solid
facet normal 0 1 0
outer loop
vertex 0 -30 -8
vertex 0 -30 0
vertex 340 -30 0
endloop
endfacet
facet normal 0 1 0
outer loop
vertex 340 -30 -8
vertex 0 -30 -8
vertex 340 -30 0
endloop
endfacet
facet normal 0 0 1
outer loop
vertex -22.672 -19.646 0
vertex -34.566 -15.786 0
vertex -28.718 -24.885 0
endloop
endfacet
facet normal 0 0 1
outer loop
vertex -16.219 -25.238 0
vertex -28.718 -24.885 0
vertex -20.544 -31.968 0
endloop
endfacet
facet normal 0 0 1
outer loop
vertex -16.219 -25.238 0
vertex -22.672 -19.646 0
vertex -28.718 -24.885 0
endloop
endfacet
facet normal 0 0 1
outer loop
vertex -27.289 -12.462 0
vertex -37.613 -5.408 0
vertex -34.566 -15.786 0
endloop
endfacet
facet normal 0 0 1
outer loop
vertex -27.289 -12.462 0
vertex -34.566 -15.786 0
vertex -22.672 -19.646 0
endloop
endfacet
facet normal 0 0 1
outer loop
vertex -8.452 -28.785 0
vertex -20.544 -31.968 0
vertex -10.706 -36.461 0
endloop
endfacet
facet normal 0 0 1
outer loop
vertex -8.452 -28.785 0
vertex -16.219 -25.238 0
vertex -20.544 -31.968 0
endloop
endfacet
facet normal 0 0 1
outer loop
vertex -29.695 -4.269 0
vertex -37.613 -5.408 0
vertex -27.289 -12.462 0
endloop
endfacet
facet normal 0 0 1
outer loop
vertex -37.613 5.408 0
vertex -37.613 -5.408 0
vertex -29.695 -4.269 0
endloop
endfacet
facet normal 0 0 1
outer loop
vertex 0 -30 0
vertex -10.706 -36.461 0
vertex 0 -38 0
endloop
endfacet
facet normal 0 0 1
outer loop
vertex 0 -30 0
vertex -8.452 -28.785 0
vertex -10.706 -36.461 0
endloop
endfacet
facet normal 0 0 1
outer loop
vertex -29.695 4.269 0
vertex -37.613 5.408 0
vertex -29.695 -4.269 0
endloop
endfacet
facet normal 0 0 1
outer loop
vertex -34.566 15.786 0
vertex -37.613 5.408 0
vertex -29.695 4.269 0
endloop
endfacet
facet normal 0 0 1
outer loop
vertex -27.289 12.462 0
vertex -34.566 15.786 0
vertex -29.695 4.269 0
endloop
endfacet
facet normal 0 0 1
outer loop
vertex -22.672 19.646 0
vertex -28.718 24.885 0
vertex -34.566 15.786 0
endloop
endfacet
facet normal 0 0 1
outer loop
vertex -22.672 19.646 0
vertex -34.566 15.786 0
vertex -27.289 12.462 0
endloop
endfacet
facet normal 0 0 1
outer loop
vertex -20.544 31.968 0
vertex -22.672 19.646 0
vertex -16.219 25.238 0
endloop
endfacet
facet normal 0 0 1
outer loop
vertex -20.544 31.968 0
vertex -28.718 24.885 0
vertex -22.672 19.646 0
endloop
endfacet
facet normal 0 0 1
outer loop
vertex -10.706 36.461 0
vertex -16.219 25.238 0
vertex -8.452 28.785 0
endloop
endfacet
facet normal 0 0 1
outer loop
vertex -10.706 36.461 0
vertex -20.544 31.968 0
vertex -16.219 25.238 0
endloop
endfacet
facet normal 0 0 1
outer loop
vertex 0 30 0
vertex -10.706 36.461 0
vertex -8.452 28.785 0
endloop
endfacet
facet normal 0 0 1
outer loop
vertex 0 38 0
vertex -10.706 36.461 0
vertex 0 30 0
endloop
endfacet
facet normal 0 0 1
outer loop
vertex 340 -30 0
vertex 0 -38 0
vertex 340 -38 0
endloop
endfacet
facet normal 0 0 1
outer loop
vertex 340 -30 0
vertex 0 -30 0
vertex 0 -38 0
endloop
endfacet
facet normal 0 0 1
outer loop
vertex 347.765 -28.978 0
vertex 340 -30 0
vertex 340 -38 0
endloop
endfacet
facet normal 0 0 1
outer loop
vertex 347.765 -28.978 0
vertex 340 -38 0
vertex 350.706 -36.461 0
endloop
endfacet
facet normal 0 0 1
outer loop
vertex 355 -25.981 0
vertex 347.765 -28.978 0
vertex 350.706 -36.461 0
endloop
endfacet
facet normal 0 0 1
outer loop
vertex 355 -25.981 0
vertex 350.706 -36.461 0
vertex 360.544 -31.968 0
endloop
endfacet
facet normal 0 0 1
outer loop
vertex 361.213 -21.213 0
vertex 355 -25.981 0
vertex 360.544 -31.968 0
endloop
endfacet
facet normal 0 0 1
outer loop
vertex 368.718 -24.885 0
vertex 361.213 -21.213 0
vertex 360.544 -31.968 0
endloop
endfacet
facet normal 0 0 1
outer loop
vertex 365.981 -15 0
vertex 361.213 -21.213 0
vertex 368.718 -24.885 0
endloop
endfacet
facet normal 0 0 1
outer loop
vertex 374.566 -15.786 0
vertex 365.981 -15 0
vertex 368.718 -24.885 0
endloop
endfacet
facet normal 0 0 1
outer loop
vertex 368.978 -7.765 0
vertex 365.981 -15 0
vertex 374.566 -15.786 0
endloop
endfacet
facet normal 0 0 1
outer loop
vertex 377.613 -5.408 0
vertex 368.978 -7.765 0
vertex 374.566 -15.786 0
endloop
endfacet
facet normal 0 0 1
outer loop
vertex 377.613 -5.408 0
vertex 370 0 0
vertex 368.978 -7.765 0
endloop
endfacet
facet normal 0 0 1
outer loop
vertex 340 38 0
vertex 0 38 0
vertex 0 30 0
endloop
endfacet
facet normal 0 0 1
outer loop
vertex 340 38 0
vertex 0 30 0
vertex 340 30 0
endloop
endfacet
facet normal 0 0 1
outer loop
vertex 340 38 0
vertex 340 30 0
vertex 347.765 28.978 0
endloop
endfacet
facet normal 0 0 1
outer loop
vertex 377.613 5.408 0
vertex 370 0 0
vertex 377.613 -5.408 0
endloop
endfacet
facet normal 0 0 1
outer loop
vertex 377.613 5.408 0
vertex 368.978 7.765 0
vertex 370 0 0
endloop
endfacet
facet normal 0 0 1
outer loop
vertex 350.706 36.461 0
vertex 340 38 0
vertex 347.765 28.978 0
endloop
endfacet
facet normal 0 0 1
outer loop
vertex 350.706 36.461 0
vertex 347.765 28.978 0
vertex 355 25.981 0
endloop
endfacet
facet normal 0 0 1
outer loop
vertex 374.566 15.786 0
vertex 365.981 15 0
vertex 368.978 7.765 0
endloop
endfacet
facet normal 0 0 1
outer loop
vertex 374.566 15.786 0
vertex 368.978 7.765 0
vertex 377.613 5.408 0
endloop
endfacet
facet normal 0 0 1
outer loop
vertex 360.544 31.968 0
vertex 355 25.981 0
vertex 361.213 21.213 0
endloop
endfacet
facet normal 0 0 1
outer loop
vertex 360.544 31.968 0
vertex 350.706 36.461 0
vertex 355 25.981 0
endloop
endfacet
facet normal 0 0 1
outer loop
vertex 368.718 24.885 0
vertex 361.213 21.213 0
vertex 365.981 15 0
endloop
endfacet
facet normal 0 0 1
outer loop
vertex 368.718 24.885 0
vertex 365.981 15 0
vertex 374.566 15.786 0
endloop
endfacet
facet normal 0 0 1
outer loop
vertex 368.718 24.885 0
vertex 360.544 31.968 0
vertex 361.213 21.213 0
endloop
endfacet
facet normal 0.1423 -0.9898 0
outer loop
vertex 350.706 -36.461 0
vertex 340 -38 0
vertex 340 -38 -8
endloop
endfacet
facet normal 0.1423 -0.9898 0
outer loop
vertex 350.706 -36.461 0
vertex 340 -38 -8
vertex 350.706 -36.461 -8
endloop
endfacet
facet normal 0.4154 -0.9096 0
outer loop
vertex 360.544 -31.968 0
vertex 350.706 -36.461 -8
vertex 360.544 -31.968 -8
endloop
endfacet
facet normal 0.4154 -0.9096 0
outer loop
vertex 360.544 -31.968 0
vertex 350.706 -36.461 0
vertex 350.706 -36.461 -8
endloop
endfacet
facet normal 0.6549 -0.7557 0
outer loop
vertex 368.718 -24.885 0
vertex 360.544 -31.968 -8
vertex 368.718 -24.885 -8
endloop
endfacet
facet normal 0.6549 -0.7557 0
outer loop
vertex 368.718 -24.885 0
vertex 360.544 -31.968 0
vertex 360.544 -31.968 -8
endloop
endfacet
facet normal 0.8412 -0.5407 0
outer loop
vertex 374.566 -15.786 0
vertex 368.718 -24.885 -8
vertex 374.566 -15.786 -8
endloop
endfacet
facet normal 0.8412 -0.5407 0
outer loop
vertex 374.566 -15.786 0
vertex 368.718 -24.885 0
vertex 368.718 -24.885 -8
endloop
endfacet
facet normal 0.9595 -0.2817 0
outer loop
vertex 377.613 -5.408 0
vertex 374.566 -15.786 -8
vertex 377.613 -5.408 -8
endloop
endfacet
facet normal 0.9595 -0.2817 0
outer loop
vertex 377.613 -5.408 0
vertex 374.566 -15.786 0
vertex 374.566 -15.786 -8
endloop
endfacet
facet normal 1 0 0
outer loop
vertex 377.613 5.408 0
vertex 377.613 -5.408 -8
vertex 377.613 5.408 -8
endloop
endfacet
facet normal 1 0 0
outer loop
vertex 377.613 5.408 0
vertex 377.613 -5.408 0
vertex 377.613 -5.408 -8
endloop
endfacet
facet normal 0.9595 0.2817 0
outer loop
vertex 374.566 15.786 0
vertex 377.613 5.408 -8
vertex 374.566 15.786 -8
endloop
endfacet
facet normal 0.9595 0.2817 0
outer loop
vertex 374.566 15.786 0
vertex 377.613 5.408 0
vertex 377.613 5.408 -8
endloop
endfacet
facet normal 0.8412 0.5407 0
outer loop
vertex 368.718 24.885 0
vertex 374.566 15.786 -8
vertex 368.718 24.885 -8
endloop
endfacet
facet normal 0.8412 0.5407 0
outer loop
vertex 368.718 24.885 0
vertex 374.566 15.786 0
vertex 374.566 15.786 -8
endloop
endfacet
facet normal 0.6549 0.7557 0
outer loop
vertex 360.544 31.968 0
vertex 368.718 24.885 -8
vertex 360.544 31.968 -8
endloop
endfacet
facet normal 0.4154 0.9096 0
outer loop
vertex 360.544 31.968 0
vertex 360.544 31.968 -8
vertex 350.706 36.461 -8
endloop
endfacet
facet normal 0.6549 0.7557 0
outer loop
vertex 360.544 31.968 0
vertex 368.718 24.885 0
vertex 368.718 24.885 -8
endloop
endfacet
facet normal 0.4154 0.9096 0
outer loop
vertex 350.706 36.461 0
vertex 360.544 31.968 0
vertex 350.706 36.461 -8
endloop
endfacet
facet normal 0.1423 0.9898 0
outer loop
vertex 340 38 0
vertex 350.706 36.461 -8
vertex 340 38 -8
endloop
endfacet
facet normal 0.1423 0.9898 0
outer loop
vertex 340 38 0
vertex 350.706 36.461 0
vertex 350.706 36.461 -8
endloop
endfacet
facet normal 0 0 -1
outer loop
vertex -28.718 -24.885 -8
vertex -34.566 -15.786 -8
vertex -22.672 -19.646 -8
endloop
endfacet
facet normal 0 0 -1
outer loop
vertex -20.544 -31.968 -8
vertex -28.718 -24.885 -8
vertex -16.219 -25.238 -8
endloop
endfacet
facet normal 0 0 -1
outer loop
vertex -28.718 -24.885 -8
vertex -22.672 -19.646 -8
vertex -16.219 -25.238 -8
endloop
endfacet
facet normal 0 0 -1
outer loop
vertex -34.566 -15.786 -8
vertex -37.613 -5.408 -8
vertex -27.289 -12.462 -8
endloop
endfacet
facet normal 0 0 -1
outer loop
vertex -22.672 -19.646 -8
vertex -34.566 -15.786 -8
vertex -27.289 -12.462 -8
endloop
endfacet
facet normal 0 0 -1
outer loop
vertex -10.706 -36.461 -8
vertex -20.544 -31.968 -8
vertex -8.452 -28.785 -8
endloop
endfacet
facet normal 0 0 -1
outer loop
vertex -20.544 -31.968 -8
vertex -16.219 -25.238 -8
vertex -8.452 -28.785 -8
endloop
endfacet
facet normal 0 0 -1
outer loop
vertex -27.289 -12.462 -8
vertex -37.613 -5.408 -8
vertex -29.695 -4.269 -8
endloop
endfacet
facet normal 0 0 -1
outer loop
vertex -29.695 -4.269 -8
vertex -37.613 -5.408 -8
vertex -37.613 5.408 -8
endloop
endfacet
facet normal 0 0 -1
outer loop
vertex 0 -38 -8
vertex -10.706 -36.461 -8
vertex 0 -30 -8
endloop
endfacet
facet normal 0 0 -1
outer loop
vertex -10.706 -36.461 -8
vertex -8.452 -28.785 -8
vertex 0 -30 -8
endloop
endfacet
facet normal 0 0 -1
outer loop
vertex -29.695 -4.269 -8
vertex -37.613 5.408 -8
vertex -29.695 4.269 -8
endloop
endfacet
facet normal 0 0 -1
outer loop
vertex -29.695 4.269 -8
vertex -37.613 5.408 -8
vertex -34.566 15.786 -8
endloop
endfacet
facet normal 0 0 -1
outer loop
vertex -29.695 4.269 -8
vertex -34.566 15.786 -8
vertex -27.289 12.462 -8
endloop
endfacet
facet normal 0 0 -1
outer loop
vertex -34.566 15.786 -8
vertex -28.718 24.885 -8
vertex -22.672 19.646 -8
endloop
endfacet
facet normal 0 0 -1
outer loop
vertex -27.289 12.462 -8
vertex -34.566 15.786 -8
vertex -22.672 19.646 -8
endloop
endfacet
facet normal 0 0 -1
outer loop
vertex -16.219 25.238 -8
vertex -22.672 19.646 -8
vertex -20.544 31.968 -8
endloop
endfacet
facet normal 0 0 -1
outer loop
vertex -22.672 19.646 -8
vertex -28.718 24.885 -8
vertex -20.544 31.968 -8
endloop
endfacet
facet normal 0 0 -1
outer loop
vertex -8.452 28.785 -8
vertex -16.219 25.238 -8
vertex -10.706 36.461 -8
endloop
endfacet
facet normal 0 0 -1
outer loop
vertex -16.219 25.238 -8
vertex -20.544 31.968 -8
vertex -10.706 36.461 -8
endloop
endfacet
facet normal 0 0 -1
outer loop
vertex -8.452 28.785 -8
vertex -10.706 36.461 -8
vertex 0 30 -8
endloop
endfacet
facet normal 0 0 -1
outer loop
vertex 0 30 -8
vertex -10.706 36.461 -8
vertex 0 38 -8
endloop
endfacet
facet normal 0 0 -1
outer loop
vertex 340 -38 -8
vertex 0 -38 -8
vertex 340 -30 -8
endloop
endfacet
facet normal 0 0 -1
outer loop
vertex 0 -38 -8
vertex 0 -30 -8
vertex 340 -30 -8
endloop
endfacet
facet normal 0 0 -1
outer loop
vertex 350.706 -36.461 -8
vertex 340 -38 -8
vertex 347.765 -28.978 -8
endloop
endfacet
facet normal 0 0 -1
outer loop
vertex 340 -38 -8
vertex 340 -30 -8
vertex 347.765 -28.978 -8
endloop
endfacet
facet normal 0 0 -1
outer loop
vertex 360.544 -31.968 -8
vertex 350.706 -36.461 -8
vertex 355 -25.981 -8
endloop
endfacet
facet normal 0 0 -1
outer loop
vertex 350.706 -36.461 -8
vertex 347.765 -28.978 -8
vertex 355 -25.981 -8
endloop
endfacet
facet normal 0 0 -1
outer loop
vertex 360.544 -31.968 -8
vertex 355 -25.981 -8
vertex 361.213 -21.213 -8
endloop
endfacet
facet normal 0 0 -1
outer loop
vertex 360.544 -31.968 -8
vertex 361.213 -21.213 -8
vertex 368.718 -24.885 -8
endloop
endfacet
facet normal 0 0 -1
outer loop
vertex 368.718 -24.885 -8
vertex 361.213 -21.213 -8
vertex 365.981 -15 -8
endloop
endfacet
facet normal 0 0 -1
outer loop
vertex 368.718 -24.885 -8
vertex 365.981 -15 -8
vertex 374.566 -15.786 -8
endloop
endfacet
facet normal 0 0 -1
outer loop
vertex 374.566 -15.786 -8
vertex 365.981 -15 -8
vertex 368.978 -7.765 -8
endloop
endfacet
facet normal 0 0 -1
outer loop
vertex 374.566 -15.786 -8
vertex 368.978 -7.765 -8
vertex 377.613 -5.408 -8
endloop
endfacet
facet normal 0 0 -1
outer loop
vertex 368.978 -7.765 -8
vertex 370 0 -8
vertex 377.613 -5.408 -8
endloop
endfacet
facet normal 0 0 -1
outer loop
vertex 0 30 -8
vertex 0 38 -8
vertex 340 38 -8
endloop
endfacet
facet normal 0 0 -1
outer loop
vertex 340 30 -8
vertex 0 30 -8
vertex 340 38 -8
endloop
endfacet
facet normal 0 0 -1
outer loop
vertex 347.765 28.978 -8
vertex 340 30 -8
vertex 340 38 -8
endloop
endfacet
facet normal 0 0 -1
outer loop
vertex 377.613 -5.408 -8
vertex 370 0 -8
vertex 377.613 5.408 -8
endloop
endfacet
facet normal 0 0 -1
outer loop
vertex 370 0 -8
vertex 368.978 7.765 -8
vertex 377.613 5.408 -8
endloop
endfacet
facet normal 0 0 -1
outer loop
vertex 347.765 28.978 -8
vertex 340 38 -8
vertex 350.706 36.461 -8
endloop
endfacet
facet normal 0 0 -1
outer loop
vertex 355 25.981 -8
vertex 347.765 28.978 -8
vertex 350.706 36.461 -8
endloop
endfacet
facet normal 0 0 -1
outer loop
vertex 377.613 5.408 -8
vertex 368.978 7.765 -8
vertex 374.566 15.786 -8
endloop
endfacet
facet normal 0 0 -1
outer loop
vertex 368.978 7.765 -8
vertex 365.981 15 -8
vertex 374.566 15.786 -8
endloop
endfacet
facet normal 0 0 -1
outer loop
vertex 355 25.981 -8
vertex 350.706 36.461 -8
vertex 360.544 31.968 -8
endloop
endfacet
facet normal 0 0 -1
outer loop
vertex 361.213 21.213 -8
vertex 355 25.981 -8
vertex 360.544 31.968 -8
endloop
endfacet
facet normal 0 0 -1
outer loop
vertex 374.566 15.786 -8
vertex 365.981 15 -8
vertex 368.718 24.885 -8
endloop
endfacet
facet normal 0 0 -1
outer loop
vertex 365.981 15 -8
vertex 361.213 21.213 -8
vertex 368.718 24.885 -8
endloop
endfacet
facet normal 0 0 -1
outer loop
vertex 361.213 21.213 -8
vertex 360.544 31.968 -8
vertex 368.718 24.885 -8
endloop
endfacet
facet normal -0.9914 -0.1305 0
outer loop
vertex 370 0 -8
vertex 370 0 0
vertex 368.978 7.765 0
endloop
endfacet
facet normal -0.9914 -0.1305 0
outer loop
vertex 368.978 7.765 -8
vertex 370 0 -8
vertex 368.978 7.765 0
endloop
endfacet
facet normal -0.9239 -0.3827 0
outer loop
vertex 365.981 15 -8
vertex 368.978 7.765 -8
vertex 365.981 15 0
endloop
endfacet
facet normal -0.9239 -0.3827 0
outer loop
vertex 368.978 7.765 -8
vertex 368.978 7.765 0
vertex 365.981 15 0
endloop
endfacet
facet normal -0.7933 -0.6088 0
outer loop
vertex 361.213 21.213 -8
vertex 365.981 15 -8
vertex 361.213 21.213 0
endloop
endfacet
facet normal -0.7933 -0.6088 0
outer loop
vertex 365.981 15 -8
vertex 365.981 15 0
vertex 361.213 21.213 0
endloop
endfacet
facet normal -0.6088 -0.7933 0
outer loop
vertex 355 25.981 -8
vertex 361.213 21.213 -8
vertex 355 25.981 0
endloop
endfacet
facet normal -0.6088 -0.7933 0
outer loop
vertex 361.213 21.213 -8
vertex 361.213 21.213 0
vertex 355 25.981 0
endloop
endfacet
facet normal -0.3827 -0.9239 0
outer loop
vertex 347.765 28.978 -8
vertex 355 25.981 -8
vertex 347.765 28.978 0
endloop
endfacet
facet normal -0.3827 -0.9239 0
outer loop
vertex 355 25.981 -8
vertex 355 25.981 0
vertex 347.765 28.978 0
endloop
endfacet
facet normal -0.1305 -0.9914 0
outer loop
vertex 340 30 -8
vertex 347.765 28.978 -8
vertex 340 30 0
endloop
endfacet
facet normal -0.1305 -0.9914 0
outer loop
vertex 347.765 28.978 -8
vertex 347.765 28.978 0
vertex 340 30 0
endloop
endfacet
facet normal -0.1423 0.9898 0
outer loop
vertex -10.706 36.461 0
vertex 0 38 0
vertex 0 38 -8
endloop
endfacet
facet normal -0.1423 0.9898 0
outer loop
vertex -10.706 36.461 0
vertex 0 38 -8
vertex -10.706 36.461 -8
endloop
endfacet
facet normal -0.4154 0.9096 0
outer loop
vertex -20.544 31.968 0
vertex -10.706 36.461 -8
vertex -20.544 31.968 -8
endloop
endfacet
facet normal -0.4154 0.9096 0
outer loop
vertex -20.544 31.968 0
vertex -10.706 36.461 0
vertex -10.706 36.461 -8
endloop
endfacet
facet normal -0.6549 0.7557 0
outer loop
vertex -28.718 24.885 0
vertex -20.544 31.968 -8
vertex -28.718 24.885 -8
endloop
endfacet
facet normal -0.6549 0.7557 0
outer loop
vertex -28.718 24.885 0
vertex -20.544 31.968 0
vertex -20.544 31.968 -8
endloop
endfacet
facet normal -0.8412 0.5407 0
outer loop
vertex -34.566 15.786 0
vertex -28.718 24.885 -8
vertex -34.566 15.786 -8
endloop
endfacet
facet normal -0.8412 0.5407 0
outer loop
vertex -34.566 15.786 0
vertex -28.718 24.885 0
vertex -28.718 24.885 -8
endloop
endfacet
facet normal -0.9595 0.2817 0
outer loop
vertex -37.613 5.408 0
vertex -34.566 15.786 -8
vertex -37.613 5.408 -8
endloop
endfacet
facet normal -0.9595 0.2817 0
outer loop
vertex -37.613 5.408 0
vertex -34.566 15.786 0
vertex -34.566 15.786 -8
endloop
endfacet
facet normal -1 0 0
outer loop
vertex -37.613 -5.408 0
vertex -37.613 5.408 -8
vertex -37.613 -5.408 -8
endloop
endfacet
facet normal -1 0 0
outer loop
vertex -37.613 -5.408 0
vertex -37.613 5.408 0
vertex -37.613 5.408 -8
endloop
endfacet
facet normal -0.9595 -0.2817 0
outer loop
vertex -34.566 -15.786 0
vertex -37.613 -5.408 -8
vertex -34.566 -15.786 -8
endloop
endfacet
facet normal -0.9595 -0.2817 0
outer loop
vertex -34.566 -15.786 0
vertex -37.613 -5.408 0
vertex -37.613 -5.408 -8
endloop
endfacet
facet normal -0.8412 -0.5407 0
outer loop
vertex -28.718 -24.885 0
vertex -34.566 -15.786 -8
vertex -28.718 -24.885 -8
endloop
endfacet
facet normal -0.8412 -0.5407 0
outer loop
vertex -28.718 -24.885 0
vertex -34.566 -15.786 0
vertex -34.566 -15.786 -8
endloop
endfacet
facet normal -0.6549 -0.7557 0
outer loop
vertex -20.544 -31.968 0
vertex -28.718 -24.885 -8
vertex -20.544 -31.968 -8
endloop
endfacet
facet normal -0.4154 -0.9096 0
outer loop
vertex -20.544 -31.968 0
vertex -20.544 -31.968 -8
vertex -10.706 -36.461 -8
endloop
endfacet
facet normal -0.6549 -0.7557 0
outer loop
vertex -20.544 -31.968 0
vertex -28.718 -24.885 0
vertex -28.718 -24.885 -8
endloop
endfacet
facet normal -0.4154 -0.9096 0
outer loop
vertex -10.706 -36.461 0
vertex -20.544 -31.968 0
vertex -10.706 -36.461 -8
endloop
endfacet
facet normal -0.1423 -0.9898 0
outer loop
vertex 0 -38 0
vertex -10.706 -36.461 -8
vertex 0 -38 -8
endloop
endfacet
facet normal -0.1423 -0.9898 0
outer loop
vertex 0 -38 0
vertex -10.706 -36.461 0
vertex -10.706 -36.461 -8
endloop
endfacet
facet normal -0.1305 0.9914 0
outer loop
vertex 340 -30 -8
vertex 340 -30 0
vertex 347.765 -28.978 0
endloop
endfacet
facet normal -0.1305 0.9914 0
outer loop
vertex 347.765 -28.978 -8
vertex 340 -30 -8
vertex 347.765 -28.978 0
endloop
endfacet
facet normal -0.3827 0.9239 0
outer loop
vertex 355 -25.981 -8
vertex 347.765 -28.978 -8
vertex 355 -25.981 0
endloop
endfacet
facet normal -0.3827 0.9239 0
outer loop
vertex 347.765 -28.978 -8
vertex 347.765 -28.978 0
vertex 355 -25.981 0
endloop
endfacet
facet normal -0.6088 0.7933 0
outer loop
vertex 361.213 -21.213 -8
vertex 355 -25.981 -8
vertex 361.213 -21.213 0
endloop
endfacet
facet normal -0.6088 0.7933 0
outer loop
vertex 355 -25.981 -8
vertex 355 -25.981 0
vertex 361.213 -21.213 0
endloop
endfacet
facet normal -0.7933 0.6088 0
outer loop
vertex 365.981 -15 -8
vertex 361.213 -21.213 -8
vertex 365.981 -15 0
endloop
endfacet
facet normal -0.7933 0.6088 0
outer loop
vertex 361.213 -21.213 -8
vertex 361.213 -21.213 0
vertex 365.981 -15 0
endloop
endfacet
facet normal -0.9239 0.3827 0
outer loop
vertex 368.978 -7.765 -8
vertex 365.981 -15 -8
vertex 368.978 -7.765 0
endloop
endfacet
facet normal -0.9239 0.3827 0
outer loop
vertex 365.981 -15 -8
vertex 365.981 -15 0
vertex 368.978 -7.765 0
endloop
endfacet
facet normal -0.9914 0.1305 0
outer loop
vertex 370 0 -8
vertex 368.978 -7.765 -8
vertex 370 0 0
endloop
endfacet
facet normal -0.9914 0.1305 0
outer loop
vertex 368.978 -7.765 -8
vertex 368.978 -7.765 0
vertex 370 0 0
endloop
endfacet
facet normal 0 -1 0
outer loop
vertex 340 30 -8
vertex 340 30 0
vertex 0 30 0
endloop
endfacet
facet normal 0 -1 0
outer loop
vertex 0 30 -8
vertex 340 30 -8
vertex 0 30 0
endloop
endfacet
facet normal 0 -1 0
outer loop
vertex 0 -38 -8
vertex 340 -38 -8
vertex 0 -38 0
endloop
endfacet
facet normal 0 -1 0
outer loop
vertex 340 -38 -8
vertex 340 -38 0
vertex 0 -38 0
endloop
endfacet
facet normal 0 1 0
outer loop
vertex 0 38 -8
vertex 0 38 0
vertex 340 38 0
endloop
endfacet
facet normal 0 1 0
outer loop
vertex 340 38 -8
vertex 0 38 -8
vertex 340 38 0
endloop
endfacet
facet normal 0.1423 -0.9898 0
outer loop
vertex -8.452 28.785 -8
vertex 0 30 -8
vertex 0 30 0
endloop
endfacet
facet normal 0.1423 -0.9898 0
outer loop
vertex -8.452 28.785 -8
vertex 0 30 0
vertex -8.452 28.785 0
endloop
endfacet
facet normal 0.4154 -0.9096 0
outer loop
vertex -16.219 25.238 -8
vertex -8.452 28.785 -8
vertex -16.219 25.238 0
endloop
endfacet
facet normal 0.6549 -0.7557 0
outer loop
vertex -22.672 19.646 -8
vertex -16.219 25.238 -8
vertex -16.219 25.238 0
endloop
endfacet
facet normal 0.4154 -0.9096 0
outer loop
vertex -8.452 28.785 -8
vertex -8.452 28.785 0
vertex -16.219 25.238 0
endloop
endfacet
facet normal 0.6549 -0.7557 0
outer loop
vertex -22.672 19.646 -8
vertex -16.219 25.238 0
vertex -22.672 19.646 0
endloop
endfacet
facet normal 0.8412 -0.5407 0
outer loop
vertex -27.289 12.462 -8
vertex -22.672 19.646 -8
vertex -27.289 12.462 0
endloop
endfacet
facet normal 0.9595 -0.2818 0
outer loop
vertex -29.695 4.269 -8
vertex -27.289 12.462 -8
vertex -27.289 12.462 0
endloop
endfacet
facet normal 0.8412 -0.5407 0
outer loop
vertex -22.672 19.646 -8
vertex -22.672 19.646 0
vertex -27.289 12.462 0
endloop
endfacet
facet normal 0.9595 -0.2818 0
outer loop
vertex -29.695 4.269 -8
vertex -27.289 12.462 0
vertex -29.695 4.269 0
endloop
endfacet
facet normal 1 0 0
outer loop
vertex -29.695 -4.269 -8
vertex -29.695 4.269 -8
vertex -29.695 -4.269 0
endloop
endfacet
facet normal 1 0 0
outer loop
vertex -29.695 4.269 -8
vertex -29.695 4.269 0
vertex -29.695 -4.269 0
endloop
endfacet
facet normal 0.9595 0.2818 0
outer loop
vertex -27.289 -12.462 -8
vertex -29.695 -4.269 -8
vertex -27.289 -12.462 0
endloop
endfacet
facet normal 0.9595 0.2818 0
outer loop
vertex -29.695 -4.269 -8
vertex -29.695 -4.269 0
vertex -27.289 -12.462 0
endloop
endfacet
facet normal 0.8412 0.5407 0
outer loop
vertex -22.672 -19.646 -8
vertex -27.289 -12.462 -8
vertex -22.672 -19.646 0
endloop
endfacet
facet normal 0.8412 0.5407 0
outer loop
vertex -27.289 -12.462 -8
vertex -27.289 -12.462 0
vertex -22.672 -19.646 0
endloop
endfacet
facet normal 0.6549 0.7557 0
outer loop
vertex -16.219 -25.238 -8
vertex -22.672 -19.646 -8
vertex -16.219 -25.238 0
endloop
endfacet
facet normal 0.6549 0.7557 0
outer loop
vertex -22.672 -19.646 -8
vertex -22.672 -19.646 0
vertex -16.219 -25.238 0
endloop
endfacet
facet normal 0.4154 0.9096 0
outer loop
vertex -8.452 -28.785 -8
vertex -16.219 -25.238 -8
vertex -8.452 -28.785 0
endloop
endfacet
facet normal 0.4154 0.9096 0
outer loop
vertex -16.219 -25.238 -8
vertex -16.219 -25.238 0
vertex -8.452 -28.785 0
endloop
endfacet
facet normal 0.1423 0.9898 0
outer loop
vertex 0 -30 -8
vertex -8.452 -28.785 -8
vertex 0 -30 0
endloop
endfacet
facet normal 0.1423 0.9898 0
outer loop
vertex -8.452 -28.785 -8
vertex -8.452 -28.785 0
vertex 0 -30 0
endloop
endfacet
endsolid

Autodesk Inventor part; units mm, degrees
ref_plane "YZ Plane" through (0, 0, 0) normal (1, 0, 0) x (0, 1, 0)
ref_plane "XZ Plane" through (0, 0, 0) normal (0, 1, 0) x (-1, 0, 0)
ref_plane "XY Plane" through (0, 0, 0) normal (0, 0, 1) x (1, 0, 0)
sketch "Sketch1" plane through (0, 0, 0) normal (0, 0, 1) x (1, 0, 0)
  circle A0 centre (0, 0) radius 10 projected
  circle A1 centre (0, 0) radius 30 projected
  circle A2 centre (340, 0) radius 10 projected
  circle A3 centre (340, 0) radius 30 projected
  line L0 (0, 38) -> (340, 38)
  arc A4 (340, -38) -> (340, 38) centre (340, 0) ccw
  line L1 (340, -38) -> (0, -38)
  arc A5 (0, 38) -> (0, -38) centre (0, 0) ccw
  line L2 (340, 30) -> (0, 30)
  arc A6 (0, 30) -> (0, -30) centre (0, 0) ccw
  line L3 (0, -30) -> (340, -30)
  arc A7 (340, -30) -> (340, 30) centre (340, 0) ccw
  dimension "d0" = 8
extrude "Extrusion1" add sketch "Sketch1" against normal blind 8 contours L0 A4 L1 A5
properties part number "ketting1"
